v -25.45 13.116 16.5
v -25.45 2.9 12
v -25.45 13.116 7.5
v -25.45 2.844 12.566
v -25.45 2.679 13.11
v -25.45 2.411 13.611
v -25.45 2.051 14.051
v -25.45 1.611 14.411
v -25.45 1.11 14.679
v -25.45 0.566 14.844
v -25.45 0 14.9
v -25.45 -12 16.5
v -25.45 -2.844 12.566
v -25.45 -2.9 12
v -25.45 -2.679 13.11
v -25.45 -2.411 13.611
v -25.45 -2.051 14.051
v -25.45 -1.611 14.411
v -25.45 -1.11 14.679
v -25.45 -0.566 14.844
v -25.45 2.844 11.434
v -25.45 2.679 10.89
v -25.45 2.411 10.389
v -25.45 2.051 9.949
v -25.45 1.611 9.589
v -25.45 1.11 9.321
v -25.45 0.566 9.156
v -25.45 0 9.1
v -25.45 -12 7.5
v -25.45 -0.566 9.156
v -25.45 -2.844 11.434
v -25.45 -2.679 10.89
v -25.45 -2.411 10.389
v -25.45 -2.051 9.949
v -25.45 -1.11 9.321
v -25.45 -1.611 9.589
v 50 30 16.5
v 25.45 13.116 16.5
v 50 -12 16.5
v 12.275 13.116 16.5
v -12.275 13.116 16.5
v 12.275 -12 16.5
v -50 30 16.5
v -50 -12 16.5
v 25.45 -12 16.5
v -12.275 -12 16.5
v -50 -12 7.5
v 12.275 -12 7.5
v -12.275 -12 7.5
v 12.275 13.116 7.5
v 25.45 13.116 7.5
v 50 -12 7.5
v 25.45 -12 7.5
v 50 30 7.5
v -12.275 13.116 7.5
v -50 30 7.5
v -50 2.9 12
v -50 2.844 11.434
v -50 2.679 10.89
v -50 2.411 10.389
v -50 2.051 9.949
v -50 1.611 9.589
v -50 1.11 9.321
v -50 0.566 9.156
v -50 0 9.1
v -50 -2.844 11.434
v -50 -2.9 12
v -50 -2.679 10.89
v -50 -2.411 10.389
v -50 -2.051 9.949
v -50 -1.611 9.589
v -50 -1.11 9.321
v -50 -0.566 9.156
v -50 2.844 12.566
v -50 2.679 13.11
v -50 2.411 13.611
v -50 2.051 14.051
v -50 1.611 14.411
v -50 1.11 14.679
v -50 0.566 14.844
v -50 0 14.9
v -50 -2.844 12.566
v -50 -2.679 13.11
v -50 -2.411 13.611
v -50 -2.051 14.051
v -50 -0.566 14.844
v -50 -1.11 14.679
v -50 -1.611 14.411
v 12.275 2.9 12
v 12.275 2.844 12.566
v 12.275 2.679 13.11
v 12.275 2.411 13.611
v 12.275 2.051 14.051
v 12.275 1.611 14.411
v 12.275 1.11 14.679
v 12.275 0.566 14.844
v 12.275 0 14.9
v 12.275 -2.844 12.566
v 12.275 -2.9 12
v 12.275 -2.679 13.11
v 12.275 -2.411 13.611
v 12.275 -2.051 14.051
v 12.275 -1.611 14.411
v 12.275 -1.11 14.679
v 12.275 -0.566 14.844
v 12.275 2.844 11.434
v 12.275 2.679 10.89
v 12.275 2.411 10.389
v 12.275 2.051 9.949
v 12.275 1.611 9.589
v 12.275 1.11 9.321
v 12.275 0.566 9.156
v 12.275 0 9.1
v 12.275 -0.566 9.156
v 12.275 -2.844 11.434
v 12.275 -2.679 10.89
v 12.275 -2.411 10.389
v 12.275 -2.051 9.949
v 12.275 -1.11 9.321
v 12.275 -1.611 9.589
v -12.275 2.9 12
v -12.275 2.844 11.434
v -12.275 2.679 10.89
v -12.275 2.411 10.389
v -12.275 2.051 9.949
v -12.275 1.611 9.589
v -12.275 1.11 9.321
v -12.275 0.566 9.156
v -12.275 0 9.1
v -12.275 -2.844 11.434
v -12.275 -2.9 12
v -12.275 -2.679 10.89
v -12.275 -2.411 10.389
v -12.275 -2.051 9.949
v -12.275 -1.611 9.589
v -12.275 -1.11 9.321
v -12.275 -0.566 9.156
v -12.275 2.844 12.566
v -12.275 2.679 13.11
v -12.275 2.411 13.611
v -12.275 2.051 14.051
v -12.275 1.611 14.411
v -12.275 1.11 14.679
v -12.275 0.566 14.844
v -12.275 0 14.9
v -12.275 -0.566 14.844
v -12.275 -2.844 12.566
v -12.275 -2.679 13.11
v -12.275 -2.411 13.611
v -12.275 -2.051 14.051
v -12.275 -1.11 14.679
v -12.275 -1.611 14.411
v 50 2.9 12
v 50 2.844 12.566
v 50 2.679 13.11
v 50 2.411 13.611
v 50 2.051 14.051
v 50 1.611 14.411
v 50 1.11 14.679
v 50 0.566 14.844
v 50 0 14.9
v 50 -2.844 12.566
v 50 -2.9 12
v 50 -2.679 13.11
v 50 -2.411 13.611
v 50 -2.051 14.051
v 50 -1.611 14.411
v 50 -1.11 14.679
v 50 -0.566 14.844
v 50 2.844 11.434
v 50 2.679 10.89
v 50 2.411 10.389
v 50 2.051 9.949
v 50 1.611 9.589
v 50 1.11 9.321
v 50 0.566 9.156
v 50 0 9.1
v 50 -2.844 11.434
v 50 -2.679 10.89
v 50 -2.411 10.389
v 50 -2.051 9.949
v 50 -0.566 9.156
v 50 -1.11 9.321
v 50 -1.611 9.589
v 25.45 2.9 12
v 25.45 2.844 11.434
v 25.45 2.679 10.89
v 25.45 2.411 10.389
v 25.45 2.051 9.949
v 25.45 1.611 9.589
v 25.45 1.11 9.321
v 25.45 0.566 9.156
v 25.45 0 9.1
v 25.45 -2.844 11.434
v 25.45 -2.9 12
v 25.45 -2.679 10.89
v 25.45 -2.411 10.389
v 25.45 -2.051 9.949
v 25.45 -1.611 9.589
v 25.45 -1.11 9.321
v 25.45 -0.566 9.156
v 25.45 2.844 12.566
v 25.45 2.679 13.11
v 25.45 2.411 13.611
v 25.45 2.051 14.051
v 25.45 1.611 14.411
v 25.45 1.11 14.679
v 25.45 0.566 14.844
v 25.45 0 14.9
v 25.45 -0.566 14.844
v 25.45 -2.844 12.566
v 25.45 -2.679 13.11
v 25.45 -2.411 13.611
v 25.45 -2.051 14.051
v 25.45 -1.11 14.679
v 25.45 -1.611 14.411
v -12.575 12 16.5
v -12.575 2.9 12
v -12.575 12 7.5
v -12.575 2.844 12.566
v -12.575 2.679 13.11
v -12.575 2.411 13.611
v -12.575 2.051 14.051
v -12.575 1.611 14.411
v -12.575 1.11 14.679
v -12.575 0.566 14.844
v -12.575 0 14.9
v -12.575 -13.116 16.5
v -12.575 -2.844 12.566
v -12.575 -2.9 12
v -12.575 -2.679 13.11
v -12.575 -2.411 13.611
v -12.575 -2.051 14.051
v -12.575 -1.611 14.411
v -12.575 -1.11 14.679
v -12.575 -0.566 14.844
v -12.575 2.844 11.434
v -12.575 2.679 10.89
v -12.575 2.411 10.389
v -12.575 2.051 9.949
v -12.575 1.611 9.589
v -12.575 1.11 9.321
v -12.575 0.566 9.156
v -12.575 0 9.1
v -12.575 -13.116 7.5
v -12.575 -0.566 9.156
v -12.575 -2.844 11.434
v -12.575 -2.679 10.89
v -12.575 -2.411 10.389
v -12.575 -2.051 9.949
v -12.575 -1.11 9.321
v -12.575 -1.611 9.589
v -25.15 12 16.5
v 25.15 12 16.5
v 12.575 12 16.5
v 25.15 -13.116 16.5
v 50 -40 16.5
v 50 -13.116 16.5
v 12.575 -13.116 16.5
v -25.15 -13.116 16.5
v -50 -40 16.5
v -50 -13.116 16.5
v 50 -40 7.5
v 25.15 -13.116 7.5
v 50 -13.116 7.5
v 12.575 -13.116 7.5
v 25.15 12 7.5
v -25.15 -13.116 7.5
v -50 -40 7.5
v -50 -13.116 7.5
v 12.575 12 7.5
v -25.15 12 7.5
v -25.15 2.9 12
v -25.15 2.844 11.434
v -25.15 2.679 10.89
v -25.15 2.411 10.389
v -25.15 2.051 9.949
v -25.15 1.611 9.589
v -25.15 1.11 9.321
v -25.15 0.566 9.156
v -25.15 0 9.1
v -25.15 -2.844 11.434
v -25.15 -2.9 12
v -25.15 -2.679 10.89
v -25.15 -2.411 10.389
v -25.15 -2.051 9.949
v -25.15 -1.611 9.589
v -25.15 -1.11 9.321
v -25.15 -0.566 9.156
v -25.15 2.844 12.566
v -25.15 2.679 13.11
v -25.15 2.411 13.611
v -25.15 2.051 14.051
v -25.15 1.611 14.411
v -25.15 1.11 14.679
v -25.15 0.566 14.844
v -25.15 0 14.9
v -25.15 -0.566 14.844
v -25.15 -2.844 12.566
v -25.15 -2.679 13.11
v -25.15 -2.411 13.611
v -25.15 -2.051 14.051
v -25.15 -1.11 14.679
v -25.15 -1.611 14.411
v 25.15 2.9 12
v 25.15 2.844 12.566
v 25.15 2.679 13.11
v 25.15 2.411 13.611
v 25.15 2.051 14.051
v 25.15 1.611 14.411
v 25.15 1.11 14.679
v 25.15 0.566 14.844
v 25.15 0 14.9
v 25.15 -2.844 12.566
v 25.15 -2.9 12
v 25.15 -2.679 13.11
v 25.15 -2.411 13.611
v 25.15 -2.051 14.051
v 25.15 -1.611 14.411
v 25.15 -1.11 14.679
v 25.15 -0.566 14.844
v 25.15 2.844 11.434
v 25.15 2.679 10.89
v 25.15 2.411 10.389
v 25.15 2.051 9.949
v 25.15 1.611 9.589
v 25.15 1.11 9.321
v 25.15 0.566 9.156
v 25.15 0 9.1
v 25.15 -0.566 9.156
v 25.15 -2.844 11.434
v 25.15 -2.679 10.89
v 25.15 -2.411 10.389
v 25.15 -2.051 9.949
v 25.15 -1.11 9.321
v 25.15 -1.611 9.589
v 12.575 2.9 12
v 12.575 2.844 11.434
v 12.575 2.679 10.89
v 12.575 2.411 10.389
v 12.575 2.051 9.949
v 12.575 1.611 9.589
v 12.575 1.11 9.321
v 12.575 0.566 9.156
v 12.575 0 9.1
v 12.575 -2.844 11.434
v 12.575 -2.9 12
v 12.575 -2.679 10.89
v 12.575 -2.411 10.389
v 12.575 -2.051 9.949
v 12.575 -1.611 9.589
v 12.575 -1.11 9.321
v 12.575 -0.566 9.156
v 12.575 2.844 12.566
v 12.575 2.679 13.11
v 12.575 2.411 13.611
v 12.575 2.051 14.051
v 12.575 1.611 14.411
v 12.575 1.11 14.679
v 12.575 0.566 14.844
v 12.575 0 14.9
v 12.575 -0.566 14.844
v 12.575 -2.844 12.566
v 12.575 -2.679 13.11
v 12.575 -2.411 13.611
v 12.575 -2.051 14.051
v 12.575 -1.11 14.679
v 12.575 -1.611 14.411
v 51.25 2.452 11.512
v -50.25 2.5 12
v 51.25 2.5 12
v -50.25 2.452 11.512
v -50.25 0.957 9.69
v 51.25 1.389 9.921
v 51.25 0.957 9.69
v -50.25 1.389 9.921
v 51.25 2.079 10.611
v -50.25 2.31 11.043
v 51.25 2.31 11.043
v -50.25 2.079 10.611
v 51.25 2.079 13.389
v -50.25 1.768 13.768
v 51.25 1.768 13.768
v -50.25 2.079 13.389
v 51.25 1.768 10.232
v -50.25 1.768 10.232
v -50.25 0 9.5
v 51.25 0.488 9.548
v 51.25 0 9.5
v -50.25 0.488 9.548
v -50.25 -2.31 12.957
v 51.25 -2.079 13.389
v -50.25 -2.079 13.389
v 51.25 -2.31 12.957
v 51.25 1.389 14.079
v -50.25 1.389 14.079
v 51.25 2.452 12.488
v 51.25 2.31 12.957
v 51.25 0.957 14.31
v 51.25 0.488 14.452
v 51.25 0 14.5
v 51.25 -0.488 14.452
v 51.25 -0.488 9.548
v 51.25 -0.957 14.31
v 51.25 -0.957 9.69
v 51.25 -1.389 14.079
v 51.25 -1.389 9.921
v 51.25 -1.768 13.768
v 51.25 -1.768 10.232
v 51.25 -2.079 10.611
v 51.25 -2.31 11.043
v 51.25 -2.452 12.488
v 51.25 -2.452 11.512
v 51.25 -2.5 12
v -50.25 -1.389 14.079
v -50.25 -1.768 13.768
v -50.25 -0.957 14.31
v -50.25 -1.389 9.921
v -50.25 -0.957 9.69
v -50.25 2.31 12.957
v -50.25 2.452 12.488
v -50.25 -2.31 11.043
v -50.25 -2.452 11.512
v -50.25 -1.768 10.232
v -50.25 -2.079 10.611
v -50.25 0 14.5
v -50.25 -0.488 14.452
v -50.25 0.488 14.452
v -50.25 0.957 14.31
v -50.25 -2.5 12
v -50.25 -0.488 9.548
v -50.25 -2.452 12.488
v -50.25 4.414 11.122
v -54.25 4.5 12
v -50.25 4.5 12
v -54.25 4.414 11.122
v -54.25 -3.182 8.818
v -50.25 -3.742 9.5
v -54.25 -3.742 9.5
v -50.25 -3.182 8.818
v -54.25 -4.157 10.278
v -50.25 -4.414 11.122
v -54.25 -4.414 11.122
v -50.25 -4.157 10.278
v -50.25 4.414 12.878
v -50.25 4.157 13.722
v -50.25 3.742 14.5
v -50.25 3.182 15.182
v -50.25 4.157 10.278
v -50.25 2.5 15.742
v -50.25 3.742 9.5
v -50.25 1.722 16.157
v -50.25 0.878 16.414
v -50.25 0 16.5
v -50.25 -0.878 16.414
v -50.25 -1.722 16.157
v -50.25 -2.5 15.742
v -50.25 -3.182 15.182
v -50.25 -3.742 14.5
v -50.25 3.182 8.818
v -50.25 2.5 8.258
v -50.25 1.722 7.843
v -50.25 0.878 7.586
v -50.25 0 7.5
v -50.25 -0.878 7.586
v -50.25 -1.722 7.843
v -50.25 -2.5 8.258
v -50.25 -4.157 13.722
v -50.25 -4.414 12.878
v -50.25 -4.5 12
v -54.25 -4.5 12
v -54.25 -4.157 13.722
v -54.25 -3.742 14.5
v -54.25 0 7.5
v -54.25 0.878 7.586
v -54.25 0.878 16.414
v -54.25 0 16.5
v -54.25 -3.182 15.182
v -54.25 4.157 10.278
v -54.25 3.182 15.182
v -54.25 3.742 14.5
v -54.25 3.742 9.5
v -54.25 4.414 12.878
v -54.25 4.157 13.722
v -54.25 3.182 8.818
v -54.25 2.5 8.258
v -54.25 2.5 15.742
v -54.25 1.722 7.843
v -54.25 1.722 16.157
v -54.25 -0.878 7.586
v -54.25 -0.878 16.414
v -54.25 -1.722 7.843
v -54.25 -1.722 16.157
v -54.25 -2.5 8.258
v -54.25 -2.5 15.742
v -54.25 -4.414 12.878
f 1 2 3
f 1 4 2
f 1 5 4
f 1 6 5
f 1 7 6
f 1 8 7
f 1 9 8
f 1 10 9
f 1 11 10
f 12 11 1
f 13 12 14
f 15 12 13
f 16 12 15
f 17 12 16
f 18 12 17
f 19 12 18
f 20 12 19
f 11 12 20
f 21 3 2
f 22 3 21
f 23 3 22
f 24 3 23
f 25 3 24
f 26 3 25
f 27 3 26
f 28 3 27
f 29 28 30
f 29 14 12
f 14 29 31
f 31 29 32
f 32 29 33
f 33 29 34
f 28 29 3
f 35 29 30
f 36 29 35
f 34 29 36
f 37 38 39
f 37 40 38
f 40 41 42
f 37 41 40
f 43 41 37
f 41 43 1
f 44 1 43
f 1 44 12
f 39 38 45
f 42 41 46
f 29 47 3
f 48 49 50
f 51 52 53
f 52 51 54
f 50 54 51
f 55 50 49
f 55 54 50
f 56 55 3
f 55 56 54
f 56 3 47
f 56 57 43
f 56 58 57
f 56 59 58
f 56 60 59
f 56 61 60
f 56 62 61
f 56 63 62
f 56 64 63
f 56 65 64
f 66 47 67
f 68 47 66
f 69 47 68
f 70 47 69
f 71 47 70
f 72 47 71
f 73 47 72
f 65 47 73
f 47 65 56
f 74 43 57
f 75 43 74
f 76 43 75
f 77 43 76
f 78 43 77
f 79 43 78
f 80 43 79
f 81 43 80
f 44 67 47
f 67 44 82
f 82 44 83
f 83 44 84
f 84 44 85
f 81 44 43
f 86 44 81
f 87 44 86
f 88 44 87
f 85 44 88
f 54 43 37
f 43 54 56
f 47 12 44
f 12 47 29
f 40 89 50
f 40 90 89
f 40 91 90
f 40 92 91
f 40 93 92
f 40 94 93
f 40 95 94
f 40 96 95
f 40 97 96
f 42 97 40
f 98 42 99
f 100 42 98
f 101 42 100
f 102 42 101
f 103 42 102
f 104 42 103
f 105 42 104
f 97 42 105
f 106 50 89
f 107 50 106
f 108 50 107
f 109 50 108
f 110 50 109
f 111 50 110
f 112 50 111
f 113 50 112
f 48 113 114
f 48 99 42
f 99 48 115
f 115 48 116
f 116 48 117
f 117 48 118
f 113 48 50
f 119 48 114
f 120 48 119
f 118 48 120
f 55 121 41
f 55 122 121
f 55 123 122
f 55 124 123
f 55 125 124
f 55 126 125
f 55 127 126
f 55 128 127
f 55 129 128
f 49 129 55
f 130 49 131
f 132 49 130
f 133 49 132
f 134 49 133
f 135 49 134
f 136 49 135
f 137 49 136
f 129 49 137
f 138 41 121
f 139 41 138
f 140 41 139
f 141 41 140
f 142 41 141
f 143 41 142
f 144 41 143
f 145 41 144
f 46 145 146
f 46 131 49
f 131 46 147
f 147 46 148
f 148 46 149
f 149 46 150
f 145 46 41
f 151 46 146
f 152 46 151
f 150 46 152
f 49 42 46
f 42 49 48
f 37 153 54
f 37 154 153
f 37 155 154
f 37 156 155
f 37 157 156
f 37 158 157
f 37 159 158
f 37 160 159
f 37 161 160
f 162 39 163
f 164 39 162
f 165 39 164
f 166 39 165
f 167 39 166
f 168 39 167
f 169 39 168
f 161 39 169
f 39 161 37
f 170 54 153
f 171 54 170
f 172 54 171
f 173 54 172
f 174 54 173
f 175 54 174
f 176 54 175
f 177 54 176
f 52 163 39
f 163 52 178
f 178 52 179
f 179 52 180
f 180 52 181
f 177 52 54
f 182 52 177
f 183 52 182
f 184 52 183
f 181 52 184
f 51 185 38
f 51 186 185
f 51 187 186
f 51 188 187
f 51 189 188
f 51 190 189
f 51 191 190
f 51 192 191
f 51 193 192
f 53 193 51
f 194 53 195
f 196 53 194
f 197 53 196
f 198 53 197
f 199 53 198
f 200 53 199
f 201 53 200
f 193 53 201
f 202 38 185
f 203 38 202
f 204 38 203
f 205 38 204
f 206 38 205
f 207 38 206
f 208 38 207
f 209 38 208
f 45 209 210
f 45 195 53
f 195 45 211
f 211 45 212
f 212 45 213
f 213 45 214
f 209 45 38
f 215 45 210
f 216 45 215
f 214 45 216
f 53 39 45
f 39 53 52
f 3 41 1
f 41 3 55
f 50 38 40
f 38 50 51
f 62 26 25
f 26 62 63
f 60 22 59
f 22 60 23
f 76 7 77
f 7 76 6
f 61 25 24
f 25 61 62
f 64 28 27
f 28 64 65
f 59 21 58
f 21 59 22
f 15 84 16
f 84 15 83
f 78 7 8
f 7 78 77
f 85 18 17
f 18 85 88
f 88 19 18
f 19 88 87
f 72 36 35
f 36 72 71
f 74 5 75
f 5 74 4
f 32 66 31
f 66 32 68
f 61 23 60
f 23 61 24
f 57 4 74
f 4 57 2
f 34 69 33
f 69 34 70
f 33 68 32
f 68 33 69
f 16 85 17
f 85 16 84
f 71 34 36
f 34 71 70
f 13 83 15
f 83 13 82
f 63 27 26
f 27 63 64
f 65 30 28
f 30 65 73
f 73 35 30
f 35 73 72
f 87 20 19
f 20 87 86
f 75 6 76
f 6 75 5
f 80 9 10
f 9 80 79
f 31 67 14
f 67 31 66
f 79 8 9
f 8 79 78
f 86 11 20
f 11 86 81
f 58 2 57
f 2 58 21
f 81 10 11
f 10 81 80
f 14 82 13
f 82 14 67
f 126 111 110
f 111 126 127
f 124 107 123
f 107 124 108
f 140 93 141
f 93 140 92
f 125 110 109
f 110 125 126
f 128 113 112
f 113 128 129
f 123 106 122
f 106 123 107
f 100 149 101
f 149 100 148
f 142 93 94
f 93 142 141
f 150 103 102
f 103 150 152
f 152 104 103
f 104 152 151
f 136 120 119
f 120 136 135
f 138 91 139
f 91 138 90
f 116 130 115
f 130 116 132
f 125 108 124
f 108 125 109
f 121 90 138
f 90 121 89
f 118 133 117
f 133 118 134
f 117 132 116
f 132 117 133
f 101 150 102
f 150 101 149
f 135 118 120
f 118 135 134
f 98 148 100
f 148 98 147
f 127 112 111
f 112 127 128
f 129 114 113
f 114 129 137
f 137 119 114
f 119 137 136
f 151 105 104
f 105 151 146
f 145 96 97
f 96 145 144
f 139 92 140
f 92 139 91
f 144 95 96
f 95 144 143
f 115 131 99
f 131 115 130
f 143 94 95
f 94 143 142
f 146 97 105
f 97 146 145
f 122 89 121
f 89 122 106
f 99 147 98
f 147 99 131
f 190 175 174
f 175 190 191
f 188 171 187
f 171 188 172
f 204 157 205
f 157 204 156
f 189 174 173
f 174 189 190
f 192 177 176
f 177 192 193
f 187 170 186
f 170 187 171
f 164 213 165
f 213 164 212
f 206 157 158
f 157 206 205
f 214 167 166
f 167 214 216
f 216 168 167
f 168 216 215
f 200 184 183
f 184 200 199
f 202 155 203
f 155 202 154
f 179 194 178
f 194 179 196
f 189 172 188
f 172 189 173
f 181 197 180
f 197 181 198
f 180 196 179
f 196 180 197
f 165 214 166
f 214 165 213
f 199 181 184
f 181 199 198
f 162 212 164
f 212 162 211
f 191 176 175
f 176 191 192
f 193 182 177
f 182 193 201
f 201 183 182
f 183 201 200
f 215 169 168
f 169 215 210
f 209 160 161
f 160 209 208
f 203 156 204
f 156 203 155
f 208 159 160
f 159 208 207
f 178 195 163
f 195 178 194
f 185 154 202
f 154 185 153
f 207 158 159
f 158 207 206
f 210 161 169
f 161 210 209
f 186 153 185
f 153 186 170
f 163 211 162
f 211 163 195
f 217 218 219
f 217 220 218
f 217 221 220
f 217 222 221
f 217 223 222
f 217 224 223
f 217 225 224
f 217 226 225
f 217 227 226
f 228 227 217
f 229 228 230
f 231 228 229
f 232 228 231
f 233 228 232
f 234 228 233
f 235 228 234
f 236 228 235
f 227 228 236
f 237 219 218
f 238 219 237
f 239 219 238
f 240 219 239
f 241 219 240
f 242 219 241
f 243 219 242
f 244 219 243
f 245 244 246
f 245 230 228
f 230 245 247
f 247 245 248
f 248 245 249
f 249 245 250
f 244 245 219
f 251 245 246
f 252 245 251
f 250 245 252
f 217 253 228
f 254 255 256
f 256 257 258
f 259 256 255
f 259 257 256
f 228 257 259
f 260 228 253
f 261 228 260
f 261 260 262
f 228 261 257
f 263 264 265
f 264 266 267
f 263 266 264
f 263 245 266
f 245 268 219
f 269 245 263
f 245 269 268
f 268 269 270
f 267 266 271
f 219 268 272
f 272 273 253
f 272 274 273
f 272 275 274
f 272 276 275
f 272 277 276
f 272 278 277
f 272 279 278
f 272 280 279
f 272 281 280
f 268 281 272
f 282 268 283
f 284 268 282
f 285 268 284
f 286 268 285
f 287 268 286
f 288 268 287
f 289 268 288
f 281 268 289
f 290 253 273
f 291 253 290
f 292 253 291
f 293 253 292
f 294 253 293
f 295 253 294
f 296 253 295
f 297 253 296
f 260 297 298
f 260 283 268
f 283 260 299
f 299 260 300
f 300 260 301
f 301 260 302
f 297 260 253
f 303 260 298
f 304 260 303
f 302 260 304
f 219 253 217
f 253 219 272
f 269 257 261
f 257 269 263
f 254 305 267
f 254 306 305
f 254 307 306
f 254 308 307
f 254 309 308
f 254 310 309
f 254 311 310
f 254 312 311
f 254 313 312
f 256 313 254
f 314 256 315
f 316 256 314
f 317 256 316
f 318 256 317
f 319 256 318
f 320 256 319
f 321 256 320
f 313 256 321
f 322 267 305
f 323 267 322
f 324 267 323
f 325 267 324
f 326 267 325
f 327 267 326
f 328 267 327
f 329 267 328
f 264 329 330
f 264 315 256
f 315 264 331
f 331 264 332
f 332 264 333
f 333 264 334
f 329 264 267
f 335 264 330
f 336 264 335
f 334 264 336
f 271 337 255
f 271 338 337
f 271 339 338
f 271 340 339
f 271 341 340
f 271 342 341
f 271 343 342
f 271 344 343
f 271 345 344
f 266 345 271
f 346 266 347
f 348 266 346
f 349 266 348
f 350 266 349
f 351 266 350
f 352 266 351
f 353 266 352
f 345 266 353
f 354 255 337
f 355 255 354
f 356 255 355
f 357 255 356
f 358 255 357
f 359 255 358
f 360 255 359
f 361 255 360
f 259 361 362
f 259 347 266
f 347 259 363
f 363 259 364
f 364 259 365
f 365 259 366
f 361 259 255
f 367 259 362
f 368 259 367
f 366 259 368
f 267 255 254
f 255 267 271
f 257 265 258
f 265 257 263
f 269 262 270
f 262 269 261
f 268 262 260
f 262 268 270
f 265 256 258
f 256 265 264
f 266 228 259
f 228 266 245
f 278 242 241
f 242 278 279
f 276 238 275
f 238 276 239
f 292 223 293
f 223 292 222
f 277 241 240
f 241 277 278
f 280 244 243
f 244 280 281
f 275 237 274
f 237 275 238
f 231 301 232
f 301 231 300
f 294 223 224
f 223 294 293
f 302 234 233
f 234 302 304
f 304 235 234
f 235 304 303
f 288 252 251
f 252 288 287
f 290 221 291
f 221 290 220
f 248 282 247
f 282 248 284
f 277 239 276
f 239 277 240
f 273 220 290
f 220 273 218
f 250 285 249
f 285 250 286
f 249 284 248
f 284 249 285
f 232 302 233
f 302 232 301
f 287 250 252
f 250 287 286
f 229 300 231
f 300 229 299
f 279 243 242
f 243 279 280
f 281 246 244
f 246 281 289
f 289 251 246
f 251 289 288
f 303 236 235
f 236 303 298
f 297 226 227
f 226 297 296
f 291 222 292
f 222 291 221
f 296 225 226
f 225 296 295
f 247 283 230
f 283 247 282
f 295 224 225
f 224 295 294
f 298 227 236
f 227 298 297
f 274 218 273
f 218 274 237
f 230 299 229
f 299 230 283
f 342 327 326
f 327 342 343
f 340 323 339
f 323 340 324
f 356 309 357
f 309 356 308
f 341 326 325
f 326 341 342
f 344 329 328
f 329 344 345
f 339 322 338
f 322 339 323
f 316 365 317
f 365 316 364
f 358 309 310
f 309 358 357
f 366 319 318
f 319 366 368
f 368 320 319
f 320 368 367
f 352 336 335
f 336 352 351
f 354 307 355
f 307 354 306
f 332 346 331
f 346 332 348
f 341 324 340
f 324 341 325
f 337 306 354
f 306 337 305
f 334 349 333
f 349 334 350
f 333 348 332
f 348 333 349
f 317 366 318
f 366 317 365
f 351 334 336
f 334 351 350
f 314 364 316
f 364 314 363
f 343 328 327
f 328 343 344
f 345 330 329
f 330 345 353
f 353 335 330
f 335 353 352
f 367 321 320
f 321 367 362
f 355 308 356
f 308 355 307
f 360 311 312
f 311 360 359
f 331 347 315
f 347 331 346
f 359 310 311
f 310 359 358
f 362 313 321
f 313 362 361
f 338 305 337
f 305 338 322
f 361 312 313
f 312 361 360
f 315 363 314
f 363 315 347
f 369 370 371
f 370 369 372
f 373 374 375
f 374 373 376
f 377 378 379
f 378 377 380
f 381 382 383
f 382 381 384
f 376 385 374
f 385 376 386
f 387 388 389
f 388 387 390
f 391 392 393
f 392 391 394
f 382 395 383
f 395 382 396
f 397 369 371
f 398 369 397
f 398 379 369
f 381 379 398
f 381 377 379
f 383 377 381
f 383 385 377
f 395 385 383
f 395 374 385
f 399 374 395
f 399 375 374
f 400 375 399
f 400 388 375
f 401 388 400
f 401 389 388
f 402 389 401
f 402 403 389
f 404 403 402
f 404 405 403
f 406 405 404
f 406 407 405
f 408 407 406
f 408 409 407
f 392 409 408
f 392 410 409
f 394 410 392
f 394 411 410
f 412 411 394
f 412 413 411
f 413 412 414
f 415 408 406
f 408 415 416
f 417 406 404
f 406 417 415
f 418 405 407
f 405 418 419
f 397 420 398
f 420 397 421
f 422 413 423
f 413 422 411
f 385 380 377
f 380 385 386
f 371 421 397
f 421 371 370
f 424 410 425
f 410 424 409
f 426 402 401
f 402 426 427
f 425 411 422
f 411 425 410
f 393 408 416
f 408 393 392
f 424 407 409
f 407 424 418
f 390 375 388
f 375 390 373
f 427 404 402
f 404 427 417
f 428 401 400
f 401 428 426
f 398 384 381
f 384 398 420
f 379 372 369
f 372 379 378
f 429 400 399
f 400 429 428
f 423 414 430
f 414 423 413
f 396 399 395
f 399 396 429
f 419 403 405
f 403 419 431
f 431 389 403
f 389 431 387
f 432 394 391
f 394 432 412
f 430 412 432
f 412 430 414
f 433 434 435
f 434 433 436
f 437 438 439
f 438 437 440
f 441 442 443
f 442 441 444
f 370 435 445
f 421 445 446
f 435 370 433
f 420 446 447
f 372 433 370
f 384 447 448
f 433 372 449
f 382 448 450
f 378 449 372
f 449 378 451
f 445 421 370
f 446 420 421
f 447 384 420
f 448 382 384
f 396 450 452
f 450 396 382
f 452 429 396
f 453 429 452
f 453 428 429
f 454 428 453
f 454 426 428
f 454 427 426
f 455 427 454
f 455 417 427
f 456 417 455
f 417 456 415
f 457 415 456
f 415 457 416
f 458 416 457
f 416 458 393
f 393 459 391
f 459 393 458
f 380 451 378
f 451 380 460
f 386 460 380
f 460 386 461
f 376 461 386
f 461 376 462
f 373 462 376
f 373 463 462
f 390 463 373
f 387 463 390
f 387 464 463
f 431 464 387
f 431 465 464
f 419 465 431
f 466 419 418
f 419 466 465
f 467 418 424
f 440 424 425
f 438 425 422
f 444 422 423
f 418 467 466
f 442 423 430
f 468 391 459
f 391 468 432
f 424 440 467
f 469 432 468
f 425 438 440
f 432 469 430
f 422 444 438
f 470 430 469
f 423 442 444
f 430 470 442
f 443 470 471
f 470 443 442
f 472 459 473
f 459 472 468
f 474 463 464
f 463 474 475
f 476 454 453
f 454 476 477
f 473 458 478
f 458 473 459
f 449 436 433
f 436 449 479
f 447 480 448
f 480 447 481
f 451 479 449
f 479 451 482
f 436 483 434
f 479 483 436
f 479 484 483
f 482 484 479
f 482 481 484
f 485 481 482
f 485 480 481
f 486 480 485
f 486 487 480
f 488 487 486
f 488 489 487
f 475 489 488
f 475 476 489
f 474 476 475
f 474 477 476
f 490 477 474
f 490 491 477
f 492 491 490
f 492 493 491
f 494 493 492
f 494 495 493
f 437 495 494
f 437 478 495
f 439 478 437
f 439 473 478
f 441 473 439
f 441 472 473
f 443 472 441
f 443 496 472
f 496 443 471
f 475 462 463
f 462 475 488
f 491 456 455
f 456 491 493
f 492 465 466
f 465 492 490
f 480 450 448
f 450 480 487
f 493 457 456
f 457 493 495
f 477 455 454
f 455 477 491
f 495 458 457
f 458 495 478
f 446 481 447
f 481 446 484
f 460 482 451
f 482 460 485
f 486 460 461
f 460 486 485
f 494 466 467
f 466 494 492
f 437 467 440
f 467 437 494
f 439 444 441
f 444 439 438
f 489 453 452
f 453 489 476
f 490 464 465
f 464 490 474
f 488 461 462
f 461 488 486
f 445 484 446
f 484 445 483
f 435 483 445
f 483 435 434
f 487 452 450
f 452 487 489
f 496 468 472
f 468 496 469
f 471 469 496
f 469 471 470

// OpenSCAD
$fn = 32;

// ------------------------------------------------------------------------
// Butt hinge: hinge 100 mm, leaf swung 0 deg
// Every part is its own module, assembly() places every instance.
// ------------------------------------------------------------------------

// --- part 1 ---
module hinge_base() {
  difference() {
    union() {
      translate([-50, -12, -4.5]) cube([24.55, 42, 9]);
      translate([-12.275, -12, -4.5]) cube([24.55, 42, 9]);
      translate([25.45, -12, -4.5]) cube([24.55, 42, 9]);
      translate([-50, 13.116, -4.5]) cube([100, 16.884, 9]);
    }
    translate([-37.725, 0, 0]) rotate([0, 90, 0]) cylinder(h = 26.55, d = 5.8, center = true);
    translate([0, 0, 0]) rotate([0, 90, 0]) cylinder(h = 26.55, d = 5.8, center = true);
    translate([37.725, 0, 0]) rotate([0, 90, 0]) cylinder(h = 26.55, d = 5.8, center = true);
  }
}

// --- part 2 ---
module hinge_mover() {
  difference() {
    union() {
      translate([-25.15, -40, -4.5]) cube([12.575, 52, 9]);
      translate([12.575, -40, -4.5]) cube([12.575, 52, 9]);
      translate([-50, -40, -4.5]) cube([100, 26.884, 9]);
    }
    translate([-18.863, 0, 0]) rotate([0, 90, 0]) cylinder(h = 14.575, d = 5.8, center = true);
    translate([18.863, 0, 0]) rotate([0, 90, 0]) cylinder(h = 14.575, d = 5.8, center = true);
  }
}

// --- part 3 ---
module hinge_pin() {
  rotate([0, 90, 0]) cylinder(h = 102.5, d = 5, center = true);
  translate([-54.25, 0, 0]) rotate([0, 90, 0]) cylinder(h = 4, d = 9);
}

// --- assembly ---
module assembly() {
  color([0.80, 0.24, 0.20]) translate([0, 0, 12]) rotate([0, 0, 0]) hinge_base();
  color([0.20, 0.45, 0.75]) translate([0, 0, 12]) rotate([0, 0, 0]) hinge_mover();
  color([0.25, 0.62, 0.32]) translate([0, 0, 12]) rotate([0, 0, 0]) hinge_pin();
}

assembly();
